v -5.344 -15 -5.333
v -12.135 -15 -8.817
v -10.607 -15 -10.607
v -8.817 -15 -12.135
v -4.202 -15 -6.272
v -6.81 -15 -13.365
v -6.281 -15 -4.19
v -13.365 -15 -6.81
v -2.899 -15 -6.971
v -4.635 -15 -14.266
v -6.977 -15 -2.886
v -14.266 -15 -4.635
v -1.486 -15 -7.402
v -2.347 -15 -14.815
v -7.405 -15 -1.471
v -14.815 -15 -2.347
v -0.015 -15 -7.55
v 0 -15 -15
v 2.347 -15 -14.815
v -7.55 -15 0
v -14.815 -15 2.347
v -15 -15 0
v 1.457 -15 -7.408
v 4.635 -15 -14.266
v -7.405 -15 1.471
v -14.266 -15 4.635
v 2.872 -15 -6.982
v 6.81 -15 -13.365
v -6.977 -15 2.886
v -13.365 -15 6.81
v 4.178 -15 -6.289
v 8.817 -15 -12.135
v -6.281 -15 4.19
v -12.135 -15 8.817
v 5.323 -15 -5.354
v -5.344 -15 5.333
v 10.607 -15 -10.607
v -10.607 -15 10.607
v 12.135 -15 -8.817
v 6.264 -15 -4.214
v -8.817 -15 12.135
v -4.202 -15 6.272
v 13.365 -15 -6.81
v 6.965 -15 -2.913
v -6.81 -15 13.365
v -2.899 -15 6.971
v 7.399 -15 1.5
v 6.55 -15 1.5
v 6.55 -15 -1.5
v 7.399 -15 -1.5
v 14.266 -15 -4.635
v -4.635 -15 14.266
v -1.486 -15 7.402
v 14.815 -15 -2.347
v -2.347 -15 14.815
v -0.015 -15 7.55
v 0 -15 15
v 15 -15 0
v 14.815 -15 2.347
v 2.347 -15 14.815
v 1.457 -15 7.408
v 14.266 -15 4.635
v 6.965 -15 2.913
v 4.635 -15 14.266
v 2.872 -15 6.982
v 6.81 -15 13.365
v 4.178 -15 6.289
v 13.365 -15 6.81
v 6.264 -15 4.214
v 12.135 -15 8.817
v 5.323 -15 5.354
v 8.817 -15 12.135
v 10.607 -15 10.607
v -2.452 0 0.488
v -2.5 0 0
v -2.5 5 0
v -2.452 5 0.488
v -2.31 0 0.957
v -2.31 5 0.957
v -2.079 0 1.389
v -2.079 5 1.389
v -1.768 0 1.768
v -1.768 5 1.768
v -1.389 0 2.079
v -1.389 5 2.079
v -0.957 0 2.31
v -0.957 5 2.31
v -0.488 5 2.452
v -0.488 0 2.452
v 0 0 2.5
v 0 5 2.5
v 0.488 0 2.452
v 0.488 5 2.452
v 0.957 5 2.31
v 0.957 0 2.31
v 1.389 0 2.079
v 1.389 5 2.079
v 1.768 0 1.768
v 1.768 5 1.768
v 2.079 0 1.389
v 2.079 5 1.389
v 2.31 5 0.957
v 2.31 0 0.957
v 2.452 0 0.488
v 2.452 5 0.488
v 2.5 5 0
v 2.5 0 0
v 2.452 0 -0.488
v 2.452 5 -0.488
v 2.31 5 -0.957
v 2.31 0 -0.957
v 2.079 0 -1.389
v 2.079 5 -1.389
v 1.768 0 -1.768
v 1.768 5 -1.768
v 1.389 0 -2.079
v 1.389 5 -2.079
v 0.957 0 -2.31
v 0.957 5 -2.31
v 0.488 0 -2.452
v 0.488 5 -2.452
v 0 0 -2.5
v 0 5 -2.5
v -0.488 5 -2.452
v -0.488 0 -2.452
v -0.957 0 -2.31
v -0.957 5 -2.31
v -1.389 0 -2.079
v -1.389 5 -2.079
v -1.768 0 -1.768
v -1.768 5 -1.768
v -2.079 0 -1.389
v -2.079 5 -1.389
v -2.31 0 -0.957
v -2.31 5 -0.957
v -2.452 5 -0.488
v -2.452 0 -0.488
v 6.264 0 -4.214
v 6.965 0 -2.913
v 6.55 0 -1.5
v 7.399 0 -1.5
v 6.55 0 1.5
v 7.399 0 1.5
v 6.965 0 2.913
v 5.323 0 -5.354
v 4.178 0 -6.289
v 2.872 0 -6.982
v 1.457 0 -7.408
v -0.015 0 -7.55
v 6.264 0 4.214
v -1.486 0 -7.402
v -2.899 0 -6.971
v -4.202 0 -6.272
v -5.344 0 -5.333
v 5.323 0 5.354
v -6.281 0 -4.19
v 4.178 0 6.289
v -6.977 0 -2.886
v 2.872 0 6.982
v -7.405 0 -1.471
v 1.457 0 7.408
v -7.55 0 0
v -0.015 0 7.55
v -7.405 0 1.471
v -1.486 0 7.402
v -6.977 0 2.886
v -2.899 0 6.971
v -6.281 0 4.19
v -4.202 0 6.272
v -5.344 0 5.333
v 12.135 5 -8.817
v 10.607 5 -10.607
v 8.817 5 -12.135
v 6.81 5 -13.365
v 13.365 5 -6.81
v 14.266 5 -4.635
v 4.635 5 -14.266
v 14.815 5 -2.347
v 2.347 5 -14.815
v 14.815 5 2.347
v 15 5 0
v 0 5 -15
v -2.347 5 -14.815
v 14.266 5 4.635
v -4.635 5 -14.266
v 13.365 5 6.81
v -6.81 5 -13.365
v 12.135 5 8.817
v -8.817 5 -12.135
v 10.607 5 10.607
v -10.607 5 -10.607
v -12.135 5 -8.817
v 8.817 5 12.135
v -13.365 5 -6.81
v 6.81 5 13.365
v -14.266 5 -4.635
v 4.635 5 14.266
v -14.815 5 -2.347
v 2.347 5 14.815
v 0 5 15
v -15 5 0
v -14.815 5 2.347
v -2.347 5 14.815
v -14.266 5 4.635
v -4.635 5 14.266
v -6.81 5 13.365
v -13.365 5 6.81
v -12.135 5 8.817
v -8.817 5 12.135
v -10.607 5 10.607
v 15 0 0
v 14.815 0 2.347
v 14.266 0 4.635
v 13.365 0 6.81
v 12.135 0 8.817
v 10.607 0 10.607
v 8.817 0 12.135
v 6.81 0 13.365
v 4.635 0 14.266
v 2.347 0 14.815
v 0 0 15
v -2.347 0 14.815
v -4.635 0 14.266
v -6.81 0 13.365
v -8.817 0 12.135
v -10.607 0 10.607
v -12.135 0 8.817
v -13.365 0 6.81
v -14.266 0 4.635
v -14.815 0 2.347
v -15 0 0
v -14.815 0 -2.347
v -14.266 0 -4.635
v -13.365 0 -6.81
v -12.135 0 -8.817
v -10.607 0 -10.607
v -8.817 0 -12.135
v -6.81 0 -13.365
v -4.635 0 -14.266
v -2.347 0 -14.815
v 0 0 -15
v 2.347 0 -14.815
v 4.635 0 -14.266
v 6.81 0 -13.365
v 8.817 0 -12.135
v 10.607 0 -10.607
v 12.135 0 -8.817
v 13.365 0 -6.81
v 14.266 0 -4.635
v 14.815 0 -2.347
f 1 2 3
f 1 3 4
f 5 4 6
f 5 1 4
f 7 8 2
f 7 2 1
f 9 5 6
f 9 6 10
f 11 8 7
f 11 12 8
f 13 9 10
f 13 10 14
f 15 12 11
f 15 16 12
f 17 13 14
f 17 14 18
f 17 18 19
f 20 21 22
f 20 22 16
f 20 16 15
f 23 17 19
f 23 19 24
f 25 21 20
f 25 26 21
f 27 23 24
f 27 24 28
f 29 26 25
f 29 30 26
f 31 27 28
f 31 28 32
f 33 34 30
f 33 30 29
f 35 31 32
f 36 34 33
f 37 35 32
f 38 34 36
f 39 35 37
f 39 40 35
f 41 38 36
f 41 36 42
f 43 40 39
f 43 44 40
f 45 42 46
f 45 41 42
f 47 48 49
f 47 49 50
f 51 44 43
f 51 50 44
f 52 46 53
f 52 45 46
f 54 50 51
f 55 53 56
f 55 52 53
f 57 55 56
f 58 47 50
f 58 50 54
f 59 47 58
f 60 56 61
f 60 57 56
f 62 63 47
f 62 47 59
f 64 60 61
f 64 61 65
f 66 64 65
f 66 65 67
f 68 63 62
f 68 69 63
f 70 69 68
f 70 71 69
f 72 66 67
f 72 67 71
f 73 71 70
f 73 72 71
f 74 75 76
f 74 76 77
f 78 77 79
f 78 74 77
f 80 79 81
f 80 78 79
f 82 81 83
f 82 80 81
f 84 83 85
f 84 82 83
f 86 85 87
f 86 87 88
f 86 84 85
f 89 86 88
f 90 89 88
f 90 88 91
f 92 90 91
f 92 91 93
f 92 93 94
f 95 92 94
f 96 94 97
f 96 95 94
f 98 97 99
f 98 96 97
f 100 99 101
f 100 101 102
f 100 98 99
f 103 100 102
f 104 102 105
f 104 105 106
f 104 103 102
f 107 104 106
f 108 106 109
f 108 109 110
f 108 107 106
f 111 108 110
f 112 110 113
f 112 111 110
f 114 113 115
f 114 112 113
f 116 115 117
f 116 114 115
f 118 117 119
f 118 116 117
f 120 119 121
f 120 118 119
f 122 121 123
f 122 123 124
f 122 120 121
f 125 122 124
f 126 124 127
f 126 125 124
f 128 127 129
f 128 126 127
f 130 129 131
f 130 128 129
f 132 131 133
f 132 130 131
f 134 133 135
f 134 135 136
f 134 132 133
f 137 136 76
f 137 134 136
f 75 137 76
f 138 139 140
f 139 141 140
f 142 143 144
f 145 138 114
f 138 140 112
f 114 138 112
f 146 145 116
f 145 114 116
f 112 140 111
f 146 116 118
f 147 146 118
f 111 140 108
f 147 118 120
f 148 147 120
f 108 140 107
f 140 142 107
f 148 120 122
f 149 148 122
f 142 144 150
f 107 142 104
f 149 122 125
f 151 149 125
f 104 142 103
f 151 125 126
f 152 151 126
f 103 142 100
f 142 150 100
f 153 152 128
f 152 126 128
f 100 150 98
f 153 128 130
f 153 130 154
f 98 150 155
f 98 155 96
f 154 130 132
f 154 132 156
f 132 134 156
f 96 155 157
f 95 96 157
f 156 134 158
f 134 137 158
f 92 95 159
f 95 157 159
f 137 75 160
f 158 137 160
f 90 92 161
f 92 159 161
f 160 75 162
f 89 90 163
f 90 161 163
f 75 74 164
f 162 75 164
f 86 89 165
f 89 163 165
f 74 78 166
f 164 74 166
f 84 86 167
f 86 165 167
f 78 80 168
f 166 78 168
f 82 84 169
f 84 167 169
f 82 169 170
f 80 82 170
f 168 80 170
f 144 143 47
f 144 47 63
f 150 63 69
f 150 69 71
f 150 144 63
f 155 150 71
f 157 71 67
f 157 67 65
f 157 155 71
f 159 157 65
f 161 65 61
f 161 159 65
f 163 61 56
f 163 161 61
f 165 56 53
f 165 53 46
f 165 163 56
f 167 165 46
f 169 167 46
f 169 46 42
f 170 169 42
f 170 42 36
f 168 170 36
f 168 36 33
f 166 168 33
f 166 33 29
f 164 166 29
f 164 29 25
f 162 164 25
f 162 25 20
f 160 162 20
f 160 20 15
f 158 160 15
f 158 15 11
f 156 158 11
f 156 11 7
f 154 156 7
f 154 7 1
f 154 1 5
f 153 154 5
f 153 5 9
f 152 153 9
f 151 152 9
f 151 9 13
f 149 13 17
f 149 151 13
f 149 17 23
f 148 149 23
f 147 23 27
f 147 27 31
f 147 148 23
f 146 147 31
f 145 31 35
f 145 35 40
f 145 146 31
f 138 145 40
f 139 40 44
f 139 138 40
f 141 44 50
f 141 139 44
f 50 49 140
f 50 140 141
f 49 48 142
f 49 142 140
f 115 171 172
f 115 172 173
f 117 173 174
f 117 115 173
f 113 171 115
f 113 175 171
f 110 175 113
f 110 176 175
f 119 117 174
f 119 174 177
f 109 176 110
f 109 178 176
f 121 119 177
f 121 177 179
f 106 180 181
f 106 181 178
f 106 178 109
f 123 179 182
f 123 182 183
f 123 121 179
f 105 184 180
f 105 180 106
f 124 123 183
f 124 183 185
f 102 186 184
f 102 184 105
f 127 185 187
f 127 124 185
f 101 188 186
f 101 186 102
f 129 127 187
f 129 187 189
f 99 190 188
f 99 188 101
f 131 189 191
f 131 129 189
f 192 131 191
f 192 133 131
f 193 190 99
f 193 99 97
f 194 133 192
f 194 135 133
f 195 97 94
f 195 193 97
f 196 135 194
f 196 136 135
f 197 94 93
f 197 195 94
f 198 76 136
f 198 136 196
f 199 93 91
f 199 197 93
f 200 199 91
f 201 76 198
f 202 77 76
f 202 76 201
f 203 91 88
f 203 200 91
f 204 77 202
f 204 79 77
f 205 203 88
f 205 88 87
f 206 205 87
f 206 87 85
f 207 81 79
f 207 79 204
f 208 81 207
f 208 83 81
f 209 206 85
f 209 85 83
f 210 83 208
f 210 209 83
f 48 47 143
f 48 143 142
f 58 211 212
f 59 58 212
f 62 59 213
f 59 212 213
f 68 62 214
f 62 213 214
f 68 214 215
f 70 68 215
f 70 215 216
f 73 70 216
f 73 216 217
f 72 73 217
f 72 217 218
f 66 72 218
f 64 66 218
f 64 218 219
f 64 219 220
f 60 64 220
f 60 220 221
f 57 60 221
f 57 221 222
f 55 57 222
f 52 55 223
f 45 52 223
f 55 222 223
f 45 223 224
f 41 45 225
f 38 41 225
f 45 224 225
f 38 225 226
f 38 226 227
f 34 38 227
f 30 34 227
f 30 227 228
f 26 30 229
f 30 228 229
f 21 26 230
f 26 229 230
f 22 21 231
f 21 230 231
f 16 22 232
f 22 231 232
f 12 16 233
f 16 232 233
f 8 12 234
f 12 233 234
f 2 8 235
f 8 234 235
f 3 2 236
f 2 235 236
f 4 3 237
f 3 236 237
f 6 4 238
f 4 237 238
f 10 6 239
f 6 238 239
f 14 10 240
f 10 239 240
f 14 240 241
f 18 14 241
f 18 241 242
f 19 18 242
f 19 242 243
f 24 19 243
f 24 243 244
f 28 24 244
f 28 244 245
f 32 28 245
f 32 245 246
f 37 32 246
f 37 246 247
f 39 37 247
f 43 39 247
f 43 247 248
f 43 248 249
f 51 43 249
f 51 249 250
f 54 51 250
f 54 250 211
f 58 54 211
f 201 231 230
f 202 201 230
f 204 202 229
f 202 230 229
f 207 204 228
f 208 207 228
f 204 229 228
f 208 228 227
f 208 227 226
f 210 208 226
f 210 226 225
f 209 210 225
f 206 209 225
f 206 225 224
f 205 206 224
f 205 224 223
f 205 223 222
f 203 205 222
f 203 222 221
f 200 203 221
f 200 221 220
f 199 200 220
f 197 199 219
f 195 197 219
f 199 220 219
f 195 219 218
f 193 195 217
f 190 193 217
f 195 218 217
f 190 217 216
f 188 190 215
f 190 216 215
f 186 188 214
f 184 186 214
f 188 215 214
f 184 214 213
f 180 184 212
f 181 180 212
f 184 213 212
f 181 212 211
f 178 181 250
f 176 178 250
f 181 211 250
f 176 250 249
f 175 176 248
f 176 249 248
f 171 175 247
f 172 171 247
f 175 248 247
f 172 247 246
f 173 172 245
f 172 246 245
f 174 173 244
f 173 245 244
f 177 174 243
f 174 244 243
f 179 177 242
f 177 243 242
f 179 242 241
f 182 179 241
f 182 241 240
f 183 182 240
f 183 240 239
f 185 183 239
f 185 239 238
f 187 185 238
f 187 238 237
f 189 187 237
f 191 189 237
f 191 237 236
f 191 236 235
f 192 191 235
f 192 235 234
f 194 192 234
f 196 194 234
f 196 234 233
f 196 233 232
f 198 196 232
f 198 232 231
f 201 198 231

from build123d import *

# Parameters (mm, degrees)
F0_R     = 15
F0_R_2   = 7.55
F1_DEPTH = 15
F2_R     = 15
F2_R_2   = 2.5
F3_DEPTH = 5
F5_DEPTH = 15


with BuildPart() as f1:
    # F0 (on Front) → F1 (new body)
    with BuildSketch(Plane.XZ):
        Circle(F0_R)
        Circle(F0_R_2, mode=Mode.SUBTRACT)
    extrude(amount=F1_DEPTH)

    # F2 (on face) → F3 (join)
    with BuildSketch(Plane(origin=(0, 0, 0), x_dir=(-1, 0, 0), z_dir=(0, 1, 0))):
        Circle(F2_R)
        Circle(F2_R_2, mode=Mode.SUBTRACT)
    extrude(amount=F3_DEPTH)

    # F4 (on face) → F5 (join)
    with BuildSketch(Plane.XZ.offset(15)):
        with BuildLine():
            ThreePointArc((7.399493, -1.5), (7.55, 0), (7.399493, 1.5))
            Line((7.399493, 1.5), (6.55, 1.5))
            Line((6.55, 1.5), (6.55, -1.5))
            Line((6.55, -1.5), (7.399493, -1.5))
        make_face()
    extrude(amount=-F5_DEPTH)


solid = f1.part
